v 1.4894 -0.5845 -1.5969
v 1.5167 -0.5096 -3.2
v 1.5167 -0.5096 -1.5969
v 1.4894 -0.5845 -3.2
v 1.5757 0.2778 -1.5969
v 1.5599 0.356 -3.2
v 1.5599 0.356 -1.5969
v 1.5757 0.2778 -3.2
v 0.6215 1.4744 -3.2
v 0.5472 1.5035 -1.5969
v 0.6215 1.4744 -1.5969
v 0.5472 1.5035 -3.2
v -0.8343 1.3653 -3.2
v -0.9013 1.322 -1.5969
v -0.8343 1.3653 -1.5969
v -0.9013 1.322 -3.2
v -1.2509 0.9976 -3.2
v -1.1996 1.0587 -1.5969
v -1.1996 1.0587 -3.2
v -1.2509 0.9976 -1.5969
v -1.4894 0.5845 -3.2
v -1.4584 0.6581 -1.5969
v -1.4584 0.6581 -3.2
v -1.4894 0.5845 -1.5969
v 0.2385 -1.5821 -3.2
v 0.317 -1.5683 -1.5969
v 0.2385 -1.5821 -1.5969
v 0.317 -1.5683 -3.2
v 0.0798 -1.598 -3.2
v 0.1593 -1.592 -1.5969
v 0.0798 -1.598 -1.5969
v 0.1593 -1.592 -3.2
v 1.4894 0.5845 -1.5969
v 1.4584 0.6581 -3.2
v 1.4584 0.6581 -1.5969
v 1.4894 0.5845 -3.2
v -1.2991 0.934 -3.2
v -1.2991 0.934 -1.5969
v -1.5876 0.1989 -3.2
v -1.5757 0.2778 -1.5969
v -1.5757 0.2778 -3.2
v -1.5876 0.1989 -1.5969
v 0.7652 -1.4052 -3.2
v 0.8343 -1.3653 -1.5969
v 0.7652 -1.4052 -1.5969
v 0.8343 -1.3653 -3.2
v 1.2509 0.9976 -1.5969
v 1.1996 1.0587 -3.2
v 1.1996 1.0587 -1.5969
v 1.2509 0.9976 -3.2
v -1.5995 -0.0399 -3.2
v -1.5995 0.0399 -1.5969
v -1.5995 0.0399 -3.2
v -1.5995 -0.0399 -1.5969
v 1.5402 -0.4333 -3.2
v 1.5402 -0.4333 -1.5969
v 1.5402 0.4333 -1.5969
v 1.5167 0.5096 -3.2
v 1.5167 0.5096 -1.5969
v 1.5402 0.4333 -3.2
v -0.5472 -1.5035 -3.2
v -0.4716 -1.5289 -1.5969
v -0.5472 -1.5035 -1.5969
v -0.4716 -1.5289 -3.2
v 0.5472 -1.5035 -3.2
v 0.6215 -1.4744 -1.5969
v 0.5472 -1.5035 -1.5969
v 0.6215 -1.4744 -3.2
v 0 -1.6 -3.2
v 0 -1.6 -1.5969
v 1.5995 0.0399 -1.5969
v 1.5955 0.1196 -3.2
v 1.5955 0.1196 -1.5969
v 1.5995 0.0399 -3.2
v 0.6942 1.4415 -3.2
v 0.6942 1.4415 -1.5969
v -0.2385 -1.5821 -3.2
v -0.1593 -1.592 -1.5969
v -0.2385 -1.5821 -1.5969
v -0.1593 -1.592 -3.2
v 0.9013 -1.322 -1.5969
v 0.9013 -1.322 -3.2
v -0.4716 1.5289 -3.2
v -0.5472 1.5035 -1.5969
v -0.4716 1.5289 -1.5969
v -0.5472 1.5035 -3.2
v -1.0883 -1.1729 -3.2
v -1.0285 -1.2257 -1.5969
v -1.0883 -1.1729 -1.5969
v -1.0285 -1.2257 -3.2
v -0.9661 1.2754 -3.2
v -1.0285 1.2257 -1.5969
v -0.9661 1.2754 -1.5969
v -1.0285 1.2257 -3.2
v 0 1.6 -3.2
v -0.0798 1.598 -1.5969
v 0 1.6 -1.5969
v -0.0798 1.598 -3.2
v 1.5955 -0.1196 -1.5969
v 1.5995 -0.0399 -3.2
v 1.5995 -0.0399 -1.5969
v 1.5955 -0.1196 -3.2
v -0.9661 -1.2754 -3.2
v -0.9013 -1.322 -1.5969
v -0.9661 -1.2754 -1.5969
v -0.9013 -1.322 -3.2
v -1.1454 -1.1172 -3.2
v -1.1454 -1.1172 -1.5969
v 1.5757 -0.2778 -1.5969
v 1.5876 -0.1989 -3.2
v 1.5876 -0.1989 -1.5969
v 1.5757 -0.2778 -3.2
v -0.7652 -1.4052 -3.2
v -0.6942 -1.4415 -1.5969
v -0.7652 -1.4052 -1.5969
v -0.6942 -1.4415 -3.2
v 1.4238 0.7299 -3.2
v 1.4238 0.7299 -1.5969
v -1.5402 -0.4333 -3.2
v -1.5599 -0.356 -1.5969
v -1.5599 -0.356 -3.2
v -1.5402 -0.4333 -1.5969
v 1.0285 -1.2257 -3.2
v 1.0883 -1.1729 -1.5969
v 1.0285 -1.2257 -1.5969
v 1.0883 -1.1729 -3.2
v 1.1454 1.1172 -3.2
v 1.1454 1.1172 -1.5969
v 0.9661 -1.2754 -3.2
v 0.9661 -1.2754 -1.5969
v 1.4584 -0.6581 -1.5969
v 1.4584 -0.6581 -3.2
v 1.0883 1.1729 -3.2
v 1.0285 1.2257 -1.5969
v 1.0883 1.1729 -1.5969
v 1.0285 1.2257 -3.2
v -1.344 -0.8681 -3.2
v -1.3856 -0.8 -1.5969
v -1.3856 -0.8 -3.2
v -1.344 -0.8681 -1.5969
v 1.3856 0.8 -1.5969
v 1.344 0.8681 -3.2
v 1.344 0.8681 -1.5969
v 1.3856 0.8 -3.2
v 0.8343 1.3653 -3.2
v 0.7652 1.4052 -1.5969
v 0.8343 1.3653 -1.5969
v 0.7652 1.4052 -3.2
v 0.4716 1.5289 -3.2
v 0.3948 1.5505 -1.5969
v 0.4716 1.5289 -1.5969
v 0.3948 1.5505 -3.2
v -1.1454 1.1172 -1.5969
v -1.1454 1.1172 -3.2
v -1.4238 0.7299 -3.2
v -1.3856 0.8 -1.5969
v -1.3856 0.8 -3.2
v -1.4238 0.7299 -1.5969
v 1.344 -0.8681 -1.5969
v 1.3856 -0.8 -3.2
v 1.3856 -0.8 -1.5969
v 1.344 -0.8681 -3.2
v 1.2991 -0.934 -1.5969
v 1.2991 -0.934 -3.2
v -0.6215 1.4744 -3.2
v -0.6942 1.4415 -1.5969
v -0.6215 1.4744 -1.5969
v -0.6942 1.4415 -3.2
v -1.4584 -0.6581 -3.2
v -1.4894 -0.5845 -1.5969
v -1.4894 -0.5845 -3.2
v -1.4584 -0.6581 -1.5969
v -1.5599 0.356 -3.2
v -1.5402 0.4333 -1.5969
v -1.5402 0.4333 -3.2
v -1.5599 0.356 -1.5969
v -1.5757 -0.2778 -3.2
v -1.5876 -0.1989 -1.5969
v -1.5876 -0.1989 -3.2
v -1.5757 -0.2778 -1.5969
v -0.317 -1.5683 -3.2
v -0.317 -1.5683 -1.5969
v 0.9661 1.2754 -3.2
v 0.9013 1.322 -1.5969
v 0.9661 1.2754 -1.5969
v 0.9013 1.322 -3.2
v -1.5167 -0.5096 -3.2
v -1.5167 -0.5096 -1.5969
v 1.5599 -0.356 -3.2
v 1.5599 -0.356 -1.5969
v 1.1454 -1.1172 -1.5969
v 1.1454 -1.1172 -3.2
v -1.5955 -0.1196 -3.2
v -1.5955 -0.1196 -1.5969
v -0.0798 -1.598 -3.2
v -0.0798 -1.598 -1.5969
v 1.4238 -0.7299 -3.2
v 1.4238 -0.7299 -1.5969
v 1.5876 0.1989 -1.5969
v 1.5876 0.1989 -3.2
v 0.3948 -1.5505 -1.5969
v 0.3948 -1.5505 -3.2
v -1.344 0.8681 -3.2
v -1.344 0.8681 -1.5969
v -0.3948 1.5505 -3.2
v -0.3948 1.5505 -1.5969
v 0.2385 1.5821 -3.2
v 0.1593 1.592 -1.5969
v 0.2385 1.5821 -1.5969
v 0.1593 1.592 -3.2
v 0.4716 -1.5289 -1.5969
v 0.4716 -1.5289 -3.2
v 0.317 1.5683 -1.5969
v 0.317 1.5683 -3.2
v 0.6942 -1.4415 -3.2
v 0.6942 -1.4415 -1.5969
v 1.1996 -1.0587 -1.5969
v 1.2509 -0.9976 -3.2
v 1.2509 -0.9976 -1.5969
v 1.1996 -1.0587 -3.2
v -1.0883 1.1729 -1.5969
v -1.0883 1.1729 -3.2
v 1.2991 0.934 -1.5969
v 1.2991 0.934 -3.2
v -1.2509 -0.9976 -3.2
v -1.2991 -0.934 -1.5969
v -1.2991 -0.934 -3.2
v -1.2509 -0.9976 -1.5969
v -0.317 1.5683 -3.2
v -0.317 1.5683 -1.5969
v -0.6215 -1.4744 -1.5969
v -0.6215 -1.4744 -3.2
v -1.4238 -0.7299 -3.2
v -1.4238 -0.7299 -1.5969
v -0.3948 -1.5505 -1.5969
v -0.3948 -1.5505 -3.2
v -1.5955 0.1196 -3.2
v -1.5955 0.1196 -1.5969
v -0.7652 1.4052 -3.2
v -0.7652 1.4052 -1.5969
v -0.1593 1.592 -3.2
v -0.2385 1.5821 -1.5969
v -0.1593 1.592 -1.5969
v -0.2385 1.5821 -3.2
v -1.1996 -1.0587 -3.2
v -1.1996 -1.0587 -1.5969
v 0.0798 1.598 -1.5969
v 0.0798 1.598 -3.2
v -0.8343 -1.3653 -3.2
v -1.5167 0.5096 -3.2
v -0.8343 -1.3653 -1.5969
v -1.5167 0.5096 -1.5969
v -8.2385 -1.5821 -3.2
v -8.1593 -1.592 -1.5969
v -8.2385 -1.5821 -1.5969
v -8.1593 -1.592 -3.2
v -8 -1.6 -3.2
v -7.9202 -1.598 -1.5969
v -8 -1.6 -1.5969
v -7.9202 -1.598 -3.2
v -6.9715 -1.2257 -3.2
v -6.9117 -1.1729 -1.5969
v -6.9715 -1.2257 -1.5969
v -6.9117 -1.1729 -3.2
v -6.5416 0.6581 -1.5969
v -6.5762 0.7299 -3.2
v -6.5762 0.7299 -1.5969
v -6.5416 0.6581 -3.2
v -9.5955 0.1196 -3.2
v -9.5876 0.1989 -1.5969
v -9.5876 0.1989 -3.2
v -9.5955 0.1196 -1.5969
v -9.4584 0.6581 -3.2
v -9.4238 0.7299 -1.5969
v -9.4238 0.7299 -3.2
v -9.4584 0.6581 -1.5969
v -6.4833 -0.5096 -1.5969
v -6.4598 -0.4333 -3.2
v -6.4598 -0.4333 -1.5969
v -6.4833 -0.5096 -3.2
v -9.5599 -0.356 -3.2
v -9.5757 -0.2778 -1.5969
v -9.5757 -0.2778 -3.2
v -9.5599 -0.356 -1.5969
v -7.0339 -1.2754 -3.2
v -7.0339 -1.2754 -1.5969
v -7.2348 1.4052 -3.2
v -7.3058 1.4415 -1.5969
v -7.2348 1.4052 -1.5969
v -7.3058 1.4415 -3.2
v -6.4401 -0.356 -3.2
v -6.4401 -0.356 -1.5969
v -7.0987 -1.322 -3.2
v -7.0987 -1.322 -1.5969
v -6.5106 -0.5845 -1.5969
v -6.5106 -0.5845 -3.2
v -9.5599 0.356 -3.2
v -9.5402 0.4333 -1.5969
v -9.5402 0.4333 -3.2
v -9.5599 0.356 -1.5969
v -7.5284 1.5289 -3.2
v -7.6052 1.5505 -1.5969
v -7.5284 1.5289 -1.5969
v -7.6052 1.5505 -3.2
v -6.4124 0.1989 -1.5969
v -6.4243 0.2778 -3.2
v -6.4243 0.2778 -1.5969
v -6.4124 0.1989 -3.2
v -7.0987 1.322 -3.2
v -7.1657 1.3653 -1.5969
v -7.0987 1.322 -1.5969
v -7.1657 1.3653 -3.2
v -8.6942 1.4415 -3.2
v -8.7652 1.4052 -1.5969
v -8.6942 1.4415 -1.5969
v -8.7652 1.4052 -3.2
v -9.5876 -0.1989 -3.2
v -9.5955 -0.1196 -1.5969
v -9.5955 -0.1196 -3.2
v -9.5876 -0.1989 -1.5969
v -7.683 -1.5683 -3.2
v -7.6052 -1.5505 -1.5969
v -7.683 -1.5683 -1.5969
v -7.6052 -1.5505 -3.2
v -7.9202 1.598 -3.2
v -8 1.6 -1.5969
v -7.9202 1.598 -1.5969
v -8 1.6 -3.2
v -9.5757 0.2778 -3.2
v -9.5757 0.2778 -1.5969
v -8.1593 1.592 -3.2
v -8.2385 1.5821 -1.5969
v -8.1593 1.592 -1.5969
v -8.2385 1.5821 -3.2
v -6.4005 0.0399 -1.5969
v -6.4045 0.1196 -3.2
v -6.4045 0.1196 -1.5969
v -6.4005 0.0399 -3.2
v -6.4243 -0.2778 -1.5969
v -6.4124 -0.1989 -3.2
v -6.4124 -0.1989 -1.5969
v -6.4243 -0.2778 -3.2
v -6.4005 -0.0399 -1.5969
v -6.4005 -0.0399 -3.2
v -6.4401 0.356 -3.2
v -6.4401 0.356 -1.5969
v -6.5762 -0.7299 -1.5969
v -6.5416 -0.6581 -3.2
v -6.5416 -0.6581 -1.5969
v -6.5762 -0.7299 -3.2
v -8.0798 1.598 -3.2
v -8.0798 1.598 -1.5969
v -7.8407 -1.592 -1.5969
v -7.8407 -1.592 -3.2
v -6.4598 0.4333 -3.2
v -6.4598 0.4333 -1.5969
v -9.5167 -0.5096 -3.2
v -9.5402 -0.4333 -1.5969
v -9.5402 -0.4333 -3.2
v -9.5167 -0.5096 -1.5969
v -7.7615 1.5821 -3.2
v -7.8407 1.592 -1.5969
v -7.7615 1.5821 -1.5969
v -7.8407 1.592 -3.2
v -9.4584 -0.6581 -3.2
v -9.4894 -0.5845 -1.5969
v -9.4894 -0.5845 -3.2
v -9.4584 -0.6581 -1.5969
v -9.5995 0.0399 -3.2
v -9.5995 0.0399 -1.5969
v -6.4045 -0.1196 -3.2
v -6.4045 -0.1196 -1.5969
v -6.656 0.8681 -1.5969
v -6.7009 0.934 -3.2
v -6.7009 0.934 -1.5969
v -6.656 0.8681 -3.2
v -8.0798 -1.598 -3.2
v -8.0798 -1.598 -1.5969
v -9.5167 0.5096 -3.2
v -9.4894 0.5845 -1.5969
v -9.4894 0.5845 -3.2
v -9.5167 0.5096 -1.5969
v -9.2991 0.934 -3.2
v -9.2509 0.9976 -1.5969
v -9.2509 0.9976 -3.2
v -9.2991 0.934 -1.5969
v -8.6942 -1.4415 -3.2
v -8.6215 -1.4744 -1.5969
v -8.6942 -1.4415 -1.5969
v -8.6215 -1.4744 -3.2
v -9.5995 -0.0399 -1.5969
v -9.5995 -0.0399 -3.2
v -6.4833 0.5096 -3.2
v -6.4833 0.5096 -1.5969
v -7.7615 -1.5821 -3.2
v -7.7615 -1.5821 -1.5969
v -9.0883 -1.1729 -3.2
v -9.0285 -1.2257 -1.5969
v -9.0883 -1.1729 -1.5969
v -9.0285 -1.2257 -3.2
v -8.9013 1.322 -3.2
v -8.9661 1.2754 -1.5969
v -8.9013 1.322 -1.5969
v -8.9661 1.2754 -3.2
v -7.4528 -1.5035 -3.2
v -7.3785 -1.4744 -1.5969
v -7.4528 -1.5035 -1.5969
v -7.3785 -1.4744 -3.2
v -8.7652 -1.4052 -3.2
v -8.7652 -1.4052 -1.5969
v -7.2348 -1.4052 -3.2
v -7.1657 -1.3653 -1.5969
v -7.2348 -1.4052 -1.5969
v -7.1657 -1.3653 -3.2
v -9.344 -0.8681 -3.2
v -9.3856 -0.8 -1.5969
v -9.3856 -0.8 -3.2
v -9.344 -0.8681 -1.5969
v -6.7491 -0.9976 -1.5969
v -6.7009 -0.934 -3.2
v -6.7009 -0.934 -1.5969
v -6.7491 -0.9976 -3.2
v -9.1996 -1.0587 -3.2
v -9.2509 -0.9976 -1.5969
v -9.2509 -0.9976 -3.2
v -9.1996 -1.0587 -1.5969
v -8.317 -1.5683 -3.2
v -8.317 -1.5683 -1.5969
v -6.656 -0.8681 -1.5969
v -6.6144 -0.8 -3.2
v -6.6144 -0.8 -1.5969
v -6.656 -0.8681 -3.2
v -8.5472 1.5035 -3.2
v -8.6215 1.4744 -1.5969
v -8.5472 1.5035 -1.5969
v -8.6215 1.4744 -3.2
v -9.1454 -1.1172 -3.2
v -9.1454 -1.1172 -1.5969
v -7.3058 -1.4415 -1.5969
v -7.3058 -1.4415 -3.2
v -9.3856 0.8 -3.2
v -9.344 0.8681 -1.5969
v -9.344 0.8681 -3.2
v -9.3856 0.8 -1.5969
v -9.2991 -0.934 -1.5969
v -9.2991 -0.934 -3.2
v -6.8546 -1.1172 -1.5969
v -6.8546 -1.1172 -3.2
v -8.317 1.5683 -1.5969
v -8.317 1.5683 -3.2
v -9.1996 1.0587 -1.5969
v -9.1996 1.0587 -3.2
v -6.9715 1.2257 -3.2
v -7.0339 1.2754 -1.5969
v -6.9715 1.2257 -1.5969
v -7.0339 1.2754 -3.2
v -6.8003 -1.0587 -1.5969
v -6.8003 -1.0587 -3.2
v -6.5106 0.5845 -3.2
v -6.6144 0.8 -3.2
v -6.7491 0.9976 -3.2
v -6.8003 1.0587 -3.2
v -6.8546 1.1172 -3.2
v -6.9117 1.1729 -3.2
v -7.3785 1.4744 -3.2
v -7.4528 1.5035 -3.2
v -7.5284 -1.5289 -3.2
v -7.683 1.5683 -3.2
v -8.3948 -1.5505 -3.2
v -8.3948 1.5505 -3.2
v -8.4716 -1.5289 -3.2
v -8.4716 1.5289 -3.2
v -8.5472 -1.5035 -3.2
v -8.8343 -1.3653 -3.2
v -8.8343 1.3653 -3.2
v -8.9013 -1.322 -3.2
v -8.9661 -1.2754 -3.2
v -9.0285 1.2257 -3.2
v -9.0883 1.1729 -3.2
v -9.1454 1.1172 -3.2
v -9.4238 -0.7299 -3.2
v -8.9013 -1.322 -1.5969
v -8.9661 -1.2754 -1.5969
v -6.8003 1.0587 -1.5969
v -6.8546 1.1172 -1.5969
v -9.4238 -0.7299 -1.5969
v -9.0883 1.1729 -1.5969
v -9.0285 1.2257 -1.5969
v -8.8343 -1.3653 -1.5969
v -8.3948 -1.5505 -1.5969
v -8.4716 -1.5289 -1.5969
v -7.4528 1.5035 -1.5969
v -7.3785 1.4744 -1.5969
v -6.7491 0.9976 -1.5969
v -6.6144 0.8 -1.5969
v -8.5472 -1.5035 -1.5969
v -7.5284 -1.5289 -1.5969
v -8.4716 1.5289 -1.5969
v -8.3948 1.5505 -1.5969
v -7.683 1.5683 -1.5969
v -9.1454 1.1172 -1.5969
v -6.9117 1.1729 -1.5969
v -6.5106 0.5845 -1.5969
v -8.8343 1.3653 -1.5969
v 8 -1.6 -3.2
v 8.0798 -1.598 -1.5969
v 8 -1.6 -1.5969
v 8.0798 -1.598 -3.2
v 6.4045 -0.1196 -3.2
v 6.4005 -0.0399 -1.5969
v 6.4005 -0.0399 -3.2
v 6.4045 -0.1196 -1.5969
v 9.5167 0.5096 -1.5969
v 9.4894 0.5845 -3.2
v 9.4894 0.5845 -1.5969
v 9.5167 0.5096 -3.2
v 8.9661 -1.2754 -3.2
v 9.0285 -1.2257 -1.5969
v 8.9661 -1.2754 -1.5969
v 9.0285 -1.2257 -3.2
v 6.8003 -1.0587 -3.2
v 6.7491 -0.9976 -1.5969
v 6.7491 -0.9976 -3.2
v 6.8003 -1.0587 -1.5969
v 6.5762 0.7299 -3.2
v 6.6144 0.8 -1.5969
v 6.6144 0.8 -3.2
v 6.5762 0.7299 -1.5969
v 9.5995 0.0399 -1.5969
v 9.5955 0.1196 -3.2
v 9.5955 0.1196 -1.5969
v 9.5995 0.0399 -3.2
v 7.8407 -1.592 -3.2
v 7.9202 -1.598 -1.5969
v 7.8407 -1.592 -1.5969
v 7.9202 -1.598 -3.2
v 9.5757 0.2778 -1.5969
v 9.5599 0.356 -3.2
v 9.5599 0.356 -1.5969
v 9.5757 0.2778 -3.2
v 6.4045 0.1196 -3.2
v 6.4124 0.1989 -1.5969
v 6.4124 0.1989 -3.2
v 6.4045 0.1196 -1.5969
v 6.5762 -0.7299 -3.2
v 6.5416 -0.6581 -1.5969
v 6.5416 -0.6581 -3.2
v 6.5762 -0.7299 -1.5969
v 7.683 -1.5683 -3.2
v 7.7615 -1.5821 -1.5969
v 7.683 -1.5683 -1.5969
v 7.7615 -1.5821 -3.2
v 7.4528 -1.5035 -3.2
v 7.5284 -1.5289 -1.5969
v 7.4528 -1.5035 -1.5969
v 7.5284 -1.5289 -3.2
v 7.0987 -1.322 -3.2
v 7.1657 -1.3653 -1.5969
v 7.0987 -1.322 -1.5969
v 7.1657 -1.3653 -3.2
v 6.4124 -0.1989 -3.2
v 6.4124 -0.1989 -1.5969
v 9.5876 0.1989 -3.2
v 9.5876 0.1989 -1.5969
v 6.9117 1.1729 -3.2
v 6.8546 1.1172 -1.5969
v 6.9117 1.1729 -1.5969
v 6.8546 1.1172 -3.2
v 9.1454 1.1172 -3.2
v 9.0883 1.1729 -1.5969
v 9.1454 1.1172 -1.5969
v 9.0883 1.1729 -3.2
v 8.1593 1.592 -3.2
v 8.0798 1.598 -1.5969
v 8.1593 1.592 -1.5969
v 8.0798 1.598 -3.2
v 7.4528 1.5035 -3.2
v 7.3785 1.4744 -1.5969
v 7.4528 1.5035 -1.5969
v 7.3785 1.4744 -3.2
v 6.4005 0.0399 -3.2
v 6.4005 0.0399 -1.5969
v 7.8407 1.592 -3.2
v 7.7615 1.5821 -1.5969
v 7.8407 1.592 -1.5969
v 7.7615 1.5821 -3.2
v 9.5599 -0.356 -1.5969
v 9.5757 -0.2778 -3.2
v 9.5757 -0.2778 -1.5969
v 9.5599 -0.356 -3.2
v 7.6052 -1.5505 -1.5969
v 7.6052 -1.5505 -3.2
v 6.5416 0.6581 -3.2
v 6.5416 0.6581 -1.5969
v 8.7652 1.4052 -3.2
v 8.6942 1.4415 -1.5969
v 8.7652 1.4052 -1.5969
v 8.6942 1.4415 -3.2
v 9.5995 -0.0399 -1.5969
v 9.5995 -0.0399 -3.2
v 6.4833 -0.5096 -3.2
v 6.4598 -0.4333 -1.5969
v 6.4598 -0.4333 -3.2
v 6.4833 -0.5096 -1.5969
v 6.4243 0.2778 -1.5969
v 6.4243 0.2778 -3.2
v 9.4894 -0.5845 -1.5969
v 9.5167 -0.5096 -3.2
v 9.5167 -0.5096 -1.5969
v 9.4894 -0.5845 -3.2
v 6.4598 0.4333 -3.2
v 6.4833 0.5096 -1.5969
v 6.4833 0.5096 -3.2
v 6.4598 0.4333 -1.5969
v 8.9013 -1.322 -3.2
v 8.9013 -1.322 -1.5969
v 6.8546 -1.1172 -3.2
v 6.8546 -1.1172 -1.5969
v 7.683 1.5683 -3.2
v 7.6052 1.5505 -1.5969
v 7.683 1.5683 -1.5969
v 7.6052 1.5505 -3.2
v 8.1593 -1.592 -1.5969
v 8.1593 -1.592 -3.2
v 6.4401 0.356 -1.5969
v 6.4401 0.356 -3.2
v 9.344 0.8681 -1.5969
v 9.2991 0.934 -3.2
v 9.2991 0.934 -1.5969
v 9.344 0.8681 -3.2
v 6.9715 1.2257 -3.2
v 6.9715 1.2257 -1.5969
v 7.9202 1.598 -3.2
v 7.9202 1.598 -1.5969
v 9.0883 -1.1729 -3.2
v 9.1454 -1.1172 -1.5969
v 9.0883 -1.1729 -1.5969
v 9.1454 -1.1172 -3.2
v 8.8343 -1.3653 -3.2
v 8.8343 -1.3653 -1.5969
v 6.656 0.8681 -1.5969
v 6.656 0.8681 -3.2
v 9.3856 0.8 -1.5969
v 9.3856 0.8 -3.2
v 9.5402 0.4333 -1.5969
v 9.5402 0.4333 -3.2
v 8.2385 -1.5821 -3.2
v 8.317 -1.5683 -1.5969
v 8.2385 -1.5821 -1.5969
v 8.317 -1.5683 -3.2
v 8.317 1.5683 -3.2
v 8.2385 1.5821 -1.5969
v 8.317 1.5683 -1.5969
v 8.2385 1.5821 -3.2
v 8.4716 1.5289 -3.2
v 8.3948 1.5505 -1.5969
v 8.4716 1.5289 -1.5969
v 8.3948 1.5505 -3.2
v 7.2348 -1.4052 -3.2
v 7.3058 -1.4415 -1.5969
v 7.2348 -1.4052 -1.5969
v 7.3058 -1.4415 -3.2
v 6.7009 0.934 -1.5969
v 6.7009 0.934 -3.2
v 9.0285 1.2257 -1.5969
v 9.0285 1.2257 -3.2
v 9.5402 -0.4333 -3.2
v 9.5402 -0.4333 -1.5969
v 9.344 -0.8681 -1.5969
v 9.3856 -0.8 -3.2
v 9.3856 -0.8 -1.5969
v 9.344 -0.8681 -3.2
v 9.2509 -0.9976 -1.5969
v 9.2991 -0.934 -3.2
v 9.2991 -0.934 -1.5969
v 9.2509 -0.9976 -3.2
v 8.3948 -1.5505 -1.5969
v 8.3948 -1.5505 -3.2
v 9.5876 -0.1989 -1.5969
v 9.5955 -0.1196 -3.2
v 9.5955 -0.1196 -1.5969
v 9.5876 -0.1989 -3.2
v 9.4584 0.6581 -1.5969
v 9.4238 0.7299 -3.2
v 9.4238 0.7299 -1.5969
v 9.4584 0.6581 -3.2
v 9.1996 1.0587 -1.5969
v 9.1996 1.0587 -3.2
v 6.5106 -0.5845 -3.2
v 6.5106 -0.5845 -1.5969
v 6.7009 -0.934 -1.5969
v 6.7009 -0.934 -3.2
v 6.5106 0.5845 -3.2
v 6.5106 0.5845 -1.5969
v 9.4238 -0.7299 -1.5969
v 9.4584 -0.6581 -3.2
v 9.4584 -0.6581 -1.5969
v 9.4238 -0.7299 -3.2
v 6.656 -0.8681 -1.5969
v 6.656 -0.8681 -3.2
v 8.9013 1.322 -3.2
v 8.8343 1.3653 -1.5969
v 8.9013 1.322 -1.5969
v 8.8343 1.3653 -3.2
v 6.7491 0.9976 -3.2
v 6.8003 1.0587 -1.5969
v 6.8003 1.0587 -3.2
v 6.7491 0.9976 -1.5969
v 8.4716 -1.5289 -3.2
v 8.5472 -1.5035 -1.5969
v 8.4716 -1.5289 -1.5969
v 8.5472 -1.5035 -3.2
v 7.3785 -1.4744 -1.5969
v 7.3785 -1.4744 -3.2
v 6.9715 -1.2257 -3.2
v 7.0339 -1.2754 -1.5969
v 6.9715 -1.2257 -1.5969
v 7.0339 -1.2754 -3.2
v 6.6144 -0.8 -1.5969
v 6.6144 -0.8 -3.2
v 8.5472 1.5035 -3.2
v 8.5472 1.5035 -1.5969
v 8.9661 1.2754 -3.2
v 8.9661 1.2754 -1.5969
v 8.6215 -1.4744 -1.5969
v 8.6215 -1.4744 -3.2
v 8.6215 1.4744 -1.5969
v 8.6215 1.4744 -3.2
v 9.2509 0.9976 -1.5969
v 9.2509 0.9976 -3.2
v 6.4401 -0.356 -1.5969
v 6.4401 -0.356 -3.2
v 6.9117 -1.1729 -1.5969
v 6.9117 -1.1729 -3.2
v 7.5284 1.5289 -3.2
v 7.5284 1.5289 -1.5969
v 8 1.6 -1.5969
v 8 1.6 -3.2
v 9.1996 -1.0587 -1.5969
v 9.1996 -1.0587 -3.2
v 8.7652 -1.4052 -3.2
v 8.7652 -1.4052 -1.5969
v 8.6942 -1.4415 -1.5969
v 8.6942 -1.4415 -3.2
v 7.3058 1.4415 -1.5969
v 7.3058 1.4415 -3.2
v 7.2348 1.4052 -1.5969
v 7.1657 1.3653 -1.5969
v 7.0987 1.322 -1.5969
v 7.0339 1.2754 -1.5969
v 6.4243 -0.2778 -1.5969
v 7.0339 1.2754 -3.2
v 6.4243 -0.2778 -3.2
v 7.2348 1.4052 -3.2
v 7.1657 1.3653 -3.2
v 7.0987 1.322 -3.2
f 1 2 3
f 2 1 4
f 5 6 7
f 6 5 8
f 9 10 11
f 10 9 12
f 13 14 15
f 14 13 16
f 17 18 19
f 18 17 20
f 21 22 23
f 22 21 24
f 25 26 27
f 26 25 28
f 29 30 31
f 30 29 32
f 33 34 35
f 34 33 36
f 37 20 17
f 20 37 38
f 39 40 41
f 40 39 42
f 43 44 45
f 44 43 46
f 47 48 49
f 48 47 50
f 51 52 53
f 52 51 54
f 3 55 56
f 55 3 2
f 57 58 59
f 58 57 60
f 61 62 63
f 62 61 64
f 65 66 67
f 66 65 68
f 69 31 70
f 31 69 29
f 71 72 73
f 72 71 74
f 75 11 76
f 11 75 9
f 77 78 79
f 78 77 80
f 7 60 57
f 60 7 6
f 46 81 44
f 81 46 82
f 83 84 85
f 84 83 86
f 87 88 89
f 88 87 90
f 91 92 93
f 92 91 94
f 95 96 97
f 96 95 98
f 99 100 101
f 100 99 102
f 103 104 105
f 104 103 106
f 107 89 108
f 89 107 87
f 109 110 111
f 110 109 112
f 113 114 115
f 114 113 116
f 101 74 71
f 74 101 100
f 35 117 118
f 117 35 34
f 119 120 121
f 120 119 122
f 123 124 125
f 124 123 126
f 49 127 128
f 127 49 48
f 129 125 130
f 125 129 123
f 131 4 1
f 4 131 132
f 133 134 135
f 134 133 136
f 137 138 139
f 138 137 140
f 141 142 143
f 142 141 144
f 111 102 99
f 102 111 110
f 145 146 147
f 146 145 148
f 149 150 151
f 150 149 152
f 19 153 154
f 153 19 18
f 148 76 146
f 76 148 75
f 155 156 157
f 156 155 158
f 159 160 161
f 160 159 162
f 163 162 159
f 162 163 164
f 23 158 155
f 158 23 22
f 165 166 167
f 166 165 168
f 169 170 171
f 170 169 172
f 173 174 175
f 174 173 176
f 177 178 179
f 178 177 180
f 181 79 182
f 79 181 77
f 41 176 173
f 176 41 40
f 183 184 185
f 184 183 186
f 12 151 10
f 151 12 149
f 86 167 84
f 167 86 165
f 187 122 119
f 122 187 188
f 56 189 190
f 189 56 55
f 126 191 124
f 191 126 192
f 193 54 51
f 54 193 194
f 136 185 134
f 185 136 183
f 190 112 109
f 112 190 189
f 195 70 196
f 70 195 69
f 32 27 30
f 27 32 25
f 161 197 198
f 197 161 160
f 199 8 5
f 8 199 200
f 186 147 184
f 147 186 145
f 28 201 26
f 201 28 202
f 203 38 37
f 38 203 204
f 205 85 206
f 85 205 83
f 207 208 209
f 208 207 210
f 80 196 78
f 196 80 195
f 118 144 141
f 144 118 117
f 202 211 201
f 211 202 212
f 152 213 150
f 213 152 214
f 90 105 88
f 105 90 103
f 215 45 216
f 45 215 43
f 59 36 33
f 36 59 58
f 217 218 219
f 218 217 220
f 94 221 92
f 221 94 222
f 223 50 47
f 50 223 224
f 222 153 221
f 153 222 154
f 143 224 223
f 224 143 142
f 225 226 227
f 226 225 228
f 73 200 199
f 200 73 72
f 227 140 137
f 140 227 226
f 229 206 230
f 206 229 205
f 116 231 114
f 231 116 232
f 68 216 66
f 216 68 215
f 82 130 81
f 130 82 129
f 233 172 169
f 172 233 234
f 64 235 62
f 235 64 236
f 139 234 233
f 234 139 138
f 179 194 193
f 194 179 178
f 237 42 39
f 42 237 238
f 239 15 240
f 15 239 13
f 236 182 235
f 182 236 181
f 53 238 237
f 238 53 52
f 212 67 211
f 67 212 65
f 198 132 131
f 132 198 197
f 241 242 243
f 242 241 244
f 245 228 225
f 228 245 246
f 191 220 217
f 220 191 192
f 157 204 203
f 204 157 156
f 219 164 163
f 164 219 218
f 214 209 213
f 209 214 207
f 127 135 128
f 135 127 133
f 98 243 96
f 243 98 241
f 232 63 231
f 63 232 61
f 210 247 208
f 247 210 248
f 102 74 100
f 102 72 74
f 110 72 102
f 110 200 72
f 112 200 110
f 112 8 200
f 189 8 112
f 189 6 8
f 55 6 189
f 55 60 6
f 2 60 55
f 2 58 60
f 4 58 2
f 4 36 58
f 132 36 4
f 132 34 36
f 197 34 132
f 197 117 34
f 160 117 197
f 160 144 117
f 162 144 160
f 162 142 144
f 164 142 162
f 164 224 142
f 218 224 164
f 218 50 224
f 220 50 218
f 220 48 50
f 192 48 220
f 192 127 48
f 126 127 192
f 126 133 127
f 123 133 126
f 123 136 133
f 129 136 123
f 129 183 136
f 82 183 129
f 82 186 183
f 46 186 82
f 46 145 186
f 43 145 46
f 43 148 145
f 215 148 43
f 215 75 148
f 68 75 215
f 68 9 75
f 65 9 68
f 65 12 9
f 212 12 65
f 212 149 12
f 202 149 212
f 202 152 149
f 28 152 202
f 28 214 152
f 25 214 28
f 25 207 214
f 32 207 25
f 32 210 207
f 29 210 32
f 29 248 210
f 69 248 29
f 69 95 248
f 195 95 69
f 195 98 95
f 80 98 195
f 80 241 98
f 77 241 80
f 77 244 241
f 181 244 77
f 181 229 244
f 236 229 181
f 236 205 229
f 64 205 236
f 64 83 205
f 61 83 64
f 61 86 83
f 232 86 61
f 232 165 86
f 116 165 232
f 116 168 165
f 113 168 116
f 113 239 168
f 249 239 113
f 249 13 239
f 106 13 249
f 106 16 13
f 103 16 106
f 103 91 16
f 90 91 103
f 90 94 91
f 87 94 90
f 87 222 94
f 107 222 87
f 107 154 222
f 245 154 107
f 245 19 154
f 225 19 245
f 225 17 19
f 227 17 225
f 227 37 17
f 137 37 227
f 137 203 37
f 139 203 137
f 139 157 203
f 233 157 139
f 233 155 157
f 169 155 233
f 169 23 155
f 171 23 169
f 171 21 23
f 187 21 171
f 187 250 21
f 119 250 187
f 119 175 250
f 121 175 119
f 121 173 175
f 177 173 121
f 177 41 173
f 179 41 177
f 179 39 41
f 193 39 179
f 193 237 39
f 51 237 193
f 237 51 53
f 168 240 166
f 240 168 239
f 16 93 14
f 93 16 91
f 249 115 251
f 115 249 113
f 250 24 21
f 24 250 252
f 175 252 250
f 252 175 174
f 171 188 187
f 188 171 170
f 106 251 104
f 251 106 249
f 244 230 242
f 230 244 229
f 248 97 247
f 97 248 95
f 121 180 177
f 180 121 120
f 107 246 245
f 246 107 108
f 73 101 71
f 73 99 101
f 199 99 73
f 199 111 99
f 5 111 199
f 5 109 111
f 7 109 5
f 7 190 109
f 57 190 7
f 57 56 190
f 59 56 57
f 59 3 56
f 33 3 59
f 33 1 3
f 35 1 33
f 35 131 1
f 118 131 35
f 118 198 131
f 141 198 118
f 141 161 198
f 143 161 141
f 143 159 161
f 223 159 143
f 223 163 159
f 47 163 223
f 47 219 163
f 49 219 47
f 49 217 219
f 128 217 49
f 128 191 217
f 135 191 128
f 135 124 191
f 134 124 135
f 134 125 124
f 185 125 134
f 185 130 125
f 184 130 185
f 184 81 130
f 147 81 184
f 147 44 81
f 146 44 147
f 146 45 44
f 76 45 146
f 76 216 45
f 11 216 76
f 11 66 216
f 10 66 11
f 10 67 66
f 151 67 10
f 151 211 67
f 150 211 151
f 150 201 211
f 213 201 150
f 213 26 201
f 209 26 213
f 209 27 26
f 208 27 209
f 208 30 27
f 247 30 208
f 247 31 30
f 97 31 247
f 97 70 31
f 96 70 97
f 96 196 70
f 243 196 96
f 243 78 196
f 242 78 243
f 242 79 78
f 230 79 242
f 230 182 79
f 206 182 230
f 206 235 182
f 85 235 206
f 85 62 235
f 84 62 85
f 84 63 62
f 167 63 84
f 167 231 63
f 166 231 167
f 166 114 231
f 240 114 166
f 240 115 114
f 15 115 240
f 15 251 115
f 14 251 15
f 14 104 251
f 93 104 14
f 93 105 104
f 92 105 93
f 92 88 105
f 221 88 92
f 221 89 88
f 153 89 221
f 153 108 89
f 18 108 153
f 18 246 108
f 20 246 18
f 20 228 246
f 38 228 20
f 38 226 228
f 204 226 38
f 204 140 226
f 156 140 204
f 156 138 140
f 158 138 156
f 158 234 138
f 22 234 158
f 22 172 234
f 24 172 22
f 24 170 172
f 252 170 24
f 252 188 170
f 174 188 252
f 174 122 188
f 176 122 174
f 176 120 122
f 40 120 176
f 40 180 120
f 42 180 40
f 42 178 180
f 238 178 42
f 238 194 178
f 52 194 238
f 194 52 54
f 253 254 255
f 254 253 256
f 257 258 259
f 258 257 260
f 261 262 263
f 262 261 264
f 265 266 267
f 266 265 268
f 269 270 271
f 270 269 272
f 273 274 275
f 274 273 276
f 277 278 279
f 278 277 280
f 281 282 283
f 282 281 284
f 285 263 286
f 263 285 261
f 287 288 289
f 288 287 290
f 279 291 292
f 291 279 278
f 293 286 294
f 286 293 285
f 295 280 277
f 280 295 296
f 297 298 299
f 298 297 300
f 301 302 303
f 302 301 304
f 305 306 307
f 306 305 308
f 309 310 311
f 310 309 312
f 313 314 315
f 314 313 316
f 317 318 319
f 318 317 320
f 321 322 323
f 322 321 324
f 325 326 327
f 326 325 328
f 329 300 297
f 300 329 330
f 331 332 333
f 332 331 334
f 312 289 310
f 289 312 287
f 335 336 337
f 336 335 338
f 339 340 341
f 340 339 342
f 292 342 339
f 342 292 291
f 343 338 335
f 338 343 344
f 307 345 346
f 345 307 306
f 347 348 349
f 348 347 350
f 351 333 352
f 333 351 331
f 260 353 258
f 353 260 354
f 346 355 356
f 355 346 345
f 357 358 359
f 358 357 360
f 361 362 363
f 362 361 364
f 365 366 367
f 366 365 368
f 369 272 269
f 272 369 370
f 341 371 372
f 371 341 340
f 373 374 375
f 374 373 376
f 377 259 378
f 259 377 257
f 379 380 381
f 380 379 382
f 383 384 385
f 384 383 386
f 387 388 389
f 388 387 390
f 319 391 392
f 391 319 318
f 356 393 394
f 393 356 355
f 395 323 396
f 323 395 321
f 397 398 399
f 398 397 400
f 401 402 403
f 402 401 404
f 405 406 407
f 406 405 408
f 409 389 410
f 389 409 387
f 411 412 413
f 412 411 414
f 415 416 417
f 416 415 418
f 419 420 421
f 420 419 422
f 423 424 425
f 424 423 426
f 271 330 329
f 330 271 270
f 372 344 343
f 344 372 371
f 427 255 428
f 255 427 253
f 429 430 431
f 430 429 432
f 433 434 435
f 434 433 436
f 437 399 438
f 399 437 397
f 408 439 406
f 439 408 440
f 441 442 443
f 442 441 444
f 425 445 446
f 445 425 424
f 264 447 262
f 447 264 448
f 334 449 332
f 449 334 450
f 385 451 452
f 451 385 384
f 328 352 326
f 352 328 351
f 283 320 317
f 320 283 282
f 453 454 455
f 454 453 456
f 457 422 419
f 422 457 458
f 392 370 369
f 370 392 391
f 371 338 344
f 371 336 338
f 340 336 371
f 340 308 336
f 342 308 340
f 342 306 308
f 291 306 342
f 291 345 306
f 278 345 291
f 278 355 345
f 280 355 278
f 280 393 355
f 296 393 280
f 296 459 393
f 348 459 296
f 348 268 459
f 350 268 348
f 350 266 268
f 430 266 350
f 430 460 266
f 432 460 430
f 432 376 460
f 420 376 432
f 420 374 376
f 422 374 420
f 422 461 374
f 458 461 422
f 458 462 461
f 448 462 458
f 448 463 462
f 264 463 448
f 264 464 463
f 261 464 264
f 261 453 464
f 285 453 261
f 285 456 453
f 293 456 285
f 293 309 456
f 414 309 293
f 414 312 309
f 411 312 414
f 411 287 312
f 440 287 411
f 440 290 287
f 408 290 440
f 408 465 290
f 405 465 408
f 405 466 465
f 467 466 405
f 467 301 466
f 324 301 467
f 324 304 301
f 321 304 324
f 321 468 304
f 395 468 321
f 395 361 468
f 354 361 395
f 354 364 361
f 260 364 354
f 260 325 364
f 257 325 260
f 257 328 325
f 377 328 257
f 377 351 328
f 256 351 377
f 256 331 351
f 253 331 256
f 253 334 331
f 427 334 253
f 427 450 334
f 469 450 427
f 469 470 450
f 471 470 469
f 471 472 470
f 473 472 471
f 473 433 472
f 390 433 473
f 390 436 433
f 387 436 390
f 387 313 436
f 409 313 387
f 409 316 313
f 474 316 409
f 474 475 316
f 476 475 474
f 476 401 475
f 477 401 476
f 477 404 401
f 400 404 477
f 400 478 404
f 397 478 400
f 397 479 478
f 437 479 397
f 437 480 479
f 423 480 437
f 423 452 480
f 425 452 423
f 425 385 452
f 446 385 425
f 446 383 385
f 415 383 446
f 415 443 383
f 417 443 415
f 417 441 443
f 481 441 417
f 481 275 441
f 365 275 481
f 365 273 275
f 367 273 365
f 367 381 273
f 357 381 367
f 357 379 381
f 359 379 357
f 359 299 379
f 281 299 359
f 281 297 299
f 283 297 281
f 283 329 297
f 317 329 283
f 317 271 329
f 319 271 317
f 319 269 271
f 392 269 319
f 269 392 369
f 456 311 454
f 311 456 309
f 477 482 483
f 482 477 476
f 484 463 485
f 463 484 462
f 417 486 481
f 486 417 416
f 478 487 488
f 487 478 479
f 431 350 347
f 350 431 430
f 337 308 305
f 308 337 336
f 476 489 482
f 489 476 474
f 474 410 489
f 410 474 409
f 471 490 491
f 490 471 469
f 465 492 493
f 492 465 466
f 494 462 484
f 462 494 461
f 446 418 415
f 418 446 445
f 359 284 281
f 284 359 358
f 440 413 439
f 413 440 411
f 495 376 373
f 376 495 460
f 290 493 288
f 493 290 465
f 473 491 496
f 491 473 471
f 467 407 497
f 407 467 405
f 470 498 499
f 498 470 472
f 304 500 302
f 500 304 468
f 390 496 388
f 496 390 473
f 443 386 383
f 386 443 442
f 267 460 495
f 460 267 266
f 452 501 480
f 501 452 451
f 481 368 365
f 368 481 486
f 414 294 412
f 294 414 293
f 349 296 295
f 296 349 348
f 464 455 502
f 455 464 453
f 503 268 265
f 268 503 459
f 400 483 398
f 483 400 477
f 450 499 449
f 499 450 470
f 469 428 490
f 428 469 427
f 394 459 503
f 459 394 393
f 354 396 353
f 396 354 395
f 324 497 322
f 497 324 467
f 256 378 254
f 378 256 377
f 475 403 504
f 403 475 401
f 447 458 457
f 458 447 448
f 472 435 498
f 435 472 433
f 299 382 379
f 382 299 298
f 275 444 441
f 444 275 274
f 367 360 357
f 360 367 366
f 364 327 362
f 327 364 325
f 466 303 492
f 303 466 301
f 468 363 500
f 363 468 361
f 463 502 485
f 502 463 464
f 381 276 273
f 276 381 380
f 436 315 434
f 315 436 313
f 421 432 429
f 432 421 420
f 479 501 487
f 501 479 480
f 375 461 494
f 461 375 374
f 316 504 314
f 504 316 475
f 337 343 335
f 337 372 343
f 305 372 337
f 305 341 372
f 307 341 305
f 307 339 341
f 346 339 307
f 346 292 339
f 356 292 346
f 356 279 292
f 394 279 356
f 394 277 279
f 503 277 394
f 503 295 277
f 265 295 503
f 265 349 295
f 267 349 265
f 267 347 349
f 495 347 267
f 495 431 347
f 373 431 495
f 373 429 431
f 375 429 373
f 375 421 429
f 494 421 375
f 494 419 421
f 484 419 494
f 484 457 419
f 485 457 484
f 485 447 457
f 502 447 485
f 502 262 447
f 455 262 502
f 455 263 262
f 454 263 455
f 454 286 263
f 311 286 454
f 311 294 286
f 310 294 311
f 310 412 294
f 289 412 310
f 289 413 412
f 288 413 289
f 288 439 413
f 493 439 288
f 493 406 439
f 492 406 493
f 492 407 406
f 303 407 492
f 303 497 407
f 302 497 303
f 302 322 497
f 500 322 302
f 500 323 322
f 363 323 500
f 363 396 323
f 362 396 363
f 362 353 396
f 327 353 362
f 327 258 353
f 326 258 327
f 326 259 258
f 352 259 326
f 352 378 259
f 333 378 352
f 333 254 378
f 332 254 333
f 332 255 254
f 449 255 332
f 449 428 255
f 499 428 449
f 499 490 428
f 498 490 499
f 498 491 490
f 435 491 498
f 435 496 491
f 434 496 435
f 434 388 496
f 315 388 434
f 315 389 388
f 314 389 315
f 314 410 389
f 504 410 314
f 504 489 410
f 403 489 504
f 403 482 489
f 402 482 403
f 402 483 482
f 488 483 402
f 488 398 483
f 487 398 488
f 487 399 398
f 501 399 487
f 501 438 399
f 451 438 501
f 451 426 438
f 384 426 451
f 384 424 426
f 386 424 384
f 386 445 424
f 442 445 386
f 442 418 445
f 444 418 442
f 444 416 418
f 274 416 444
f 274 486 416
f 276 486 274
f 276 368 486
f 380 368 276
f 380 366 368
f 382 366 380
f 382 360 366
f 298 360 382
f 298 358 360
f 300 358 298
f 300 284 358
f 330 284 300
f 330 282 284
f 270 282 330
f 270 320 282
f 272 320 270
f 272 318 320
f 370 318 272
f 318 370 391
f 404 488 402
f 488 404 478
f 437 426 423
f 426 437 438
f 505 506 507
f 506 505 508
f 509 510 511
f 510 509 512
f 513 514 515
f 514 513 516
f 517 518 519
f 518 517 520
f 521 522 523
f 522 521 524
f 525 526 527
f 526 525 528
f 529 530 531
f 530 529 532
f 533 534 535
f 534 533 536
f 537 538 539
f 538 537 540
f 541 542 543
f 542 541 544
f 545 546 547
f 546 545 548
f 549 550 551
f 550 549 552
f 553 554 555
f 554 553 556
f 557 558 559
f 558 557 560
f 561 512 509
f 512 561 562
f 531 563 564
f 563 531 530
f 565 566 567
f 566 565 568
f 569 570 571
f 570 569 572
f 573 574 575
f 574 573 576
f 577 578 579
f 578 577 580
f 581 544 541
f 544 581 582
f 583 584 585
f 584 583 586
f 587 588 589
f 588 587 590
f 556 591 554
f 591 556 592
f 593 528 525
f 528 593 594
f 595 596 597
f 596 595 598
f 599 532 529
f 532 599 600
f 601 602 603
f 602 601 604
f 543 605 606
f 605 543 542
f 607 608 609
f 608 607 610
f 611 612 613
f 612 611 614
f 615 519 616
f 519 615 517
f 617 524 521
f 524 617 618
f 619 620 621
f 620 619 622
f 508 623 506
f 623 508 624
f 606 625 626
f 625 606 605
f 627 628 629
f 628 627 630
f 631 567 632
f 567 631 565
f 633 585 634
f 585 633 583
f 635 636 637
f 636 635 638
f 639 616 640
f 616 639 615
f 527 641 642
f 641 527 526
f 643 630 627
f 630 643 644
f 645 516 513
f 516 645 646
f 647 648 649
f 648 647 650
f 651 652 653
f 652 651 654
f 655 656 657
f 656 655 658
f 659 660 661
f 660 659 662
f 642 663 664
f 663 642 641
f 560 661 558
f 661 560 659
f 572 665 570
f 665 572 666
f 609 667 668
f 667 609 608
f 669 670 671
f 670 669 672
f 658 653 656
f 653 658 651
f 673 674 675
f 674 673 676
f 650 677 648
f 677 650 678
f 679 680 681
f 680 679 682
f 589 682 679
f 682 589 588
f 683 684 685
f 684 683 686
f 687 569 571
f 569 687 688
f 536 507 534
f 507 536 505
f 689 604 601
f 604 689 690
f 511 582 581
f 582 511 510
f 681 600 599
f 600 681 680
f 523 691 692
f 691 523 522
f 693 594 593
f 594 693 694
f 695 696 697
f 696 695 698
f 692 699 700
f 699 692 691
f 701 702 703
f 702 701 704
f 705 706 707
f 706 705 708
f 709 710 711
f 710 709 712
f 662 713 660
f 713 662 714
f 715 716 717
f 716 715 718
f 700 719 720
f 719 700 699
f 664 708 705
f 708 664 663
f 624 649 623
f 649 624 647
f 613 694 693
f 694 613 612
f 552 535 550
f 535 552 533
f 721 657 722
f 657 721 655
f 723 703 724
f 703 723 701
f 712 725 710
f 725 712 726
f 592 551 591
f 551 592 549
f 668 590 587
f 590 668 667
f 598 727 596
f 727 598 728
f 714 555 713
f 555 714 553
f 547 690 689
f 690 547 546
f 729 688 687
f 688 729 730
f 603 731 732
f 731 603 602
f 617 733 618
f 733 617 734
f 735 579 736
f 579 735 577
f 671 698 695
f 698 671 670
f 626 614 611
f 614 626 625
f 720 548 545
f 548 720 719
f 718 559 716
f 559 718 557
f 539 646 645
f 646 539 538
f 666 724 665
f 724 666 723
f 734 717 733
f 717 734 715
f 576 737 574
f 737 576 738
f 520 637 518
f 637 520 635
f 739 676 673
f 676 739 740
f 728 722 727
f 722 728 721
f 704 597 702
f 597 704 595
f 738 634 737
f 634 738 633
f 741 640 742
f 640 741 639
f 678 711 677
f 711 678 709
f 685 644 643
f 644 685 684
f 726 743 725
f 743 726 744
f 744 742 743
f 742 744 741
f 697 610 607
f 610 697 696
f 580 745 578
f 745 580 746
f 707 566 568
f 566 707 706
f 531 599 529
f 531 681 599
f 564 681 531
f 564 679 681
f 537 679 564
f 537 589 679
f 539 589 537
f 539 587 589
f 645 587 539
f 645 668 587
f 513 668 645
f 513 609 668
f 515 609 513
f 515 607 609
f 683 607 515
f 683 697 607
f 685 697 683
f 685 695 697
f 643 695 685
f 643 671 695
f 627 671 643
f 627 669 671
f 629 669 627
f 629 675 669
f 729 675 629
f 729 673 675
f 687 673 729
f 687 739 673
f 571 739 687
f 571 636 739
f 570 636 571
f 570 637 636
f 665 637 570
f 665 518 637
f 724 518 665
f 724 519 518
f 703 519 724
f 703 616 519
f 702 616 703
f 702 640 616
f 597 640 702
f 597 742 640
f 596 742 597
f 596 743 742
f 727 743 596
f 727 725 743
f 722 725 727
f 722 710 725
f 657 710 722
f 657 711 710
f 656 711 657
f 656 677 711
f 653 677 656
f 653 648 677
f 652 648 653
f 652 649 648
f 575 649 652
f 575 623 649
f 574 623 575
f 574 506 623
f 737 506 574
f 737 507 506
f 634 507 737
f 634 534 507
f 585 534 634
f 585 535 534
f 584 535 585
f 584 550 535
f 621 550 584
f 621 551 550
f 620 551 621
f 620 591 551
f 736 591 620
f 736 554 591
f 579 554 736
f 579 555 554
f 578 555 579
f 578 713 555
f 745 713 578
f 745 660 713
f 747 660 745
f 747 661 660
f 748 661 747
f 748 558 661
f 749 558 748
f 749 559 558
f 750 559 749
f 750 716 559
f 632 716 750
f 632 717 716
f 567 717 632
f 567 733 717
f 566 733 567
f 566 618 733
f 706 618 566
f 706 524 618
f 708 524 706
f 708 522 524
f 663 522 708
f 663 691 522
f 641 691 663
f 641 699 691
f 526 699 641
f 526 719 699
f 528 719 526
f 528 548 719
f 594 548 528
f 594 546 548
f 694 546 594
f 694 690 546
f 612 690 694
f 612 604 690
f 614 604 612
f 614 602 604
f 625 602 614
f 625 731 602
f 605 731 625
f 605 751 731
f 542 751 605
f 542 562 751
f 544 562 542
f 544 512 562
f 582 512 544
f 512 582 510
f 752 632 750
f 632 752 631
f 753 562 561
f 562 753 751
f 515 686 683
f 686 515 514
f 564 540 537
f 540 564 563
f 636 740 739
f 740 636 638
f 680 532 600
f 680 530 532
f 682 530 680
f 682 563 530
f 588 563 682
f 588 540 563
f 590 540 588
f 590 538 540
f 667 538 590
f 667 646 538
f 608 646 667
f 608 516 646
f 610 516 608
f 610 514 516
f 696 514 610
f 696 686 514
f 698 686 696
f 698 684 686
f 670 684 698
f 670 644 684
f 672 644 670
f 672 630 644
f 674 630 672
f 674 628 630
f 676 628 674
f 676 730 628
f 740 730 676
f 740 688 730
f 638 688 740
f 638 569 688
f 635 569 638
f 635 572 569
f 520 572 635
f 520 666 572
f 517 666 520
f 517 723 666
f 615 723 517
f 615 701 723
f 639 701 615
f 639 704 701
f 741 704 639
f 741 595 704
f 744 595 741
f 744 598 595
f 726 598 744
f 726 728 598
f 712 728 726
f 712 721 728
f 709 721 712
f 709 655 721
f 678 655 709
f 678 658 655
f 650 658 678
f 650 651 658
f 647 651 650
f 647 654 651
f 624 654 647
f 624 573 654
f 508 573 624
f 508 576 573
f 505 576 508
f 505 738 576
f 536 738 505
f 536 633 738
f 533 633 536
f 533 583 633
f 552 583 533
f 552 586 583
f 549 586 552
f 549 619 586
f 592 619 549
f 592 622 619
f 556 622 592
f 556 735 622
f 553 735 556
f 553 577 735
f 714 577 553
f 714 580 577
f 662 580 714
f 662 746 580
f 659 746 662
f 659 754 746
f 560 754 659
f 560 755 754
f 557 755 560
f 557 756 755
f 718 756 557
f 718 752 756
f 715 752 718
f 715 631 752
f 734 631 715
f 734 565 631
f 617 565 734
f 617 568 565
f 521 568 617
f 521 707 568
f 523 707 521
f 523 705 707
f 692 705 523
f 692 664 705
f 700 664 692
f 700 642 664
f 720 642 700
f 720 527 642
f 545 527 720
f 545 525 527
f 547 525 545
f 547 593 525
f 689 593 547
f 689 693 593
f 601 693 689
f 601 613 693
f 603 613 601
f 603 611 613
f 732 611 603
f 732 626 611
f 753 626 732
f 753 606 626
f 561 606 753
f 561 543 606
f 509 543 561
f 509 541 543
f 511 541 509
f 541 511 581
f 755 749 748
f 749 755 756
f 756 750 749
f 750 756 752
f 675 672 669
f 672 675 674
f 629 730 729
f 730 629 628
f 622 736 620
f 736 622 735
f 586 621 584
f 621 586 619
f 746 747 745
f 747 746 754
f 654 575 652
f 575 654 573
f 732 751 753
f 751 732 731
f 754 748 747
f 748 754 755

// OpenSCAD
use <../lib.scad>
use <2431.scad>
use <6005724a1.scad>
$fa=1; $fs=0.2;
function ldraw_lib__2431dm0(realsolid=false) = [
// 0 Tile  1 x  4 with Wood Grain and Nails Type 1 Sticker
// 0 Name: 2431dm0.dat
// 0 Author: Christian Neumann [Wesley]
// 0 !LDRAW_ORG Shortcut UPDATE 2014-02
// 0 !LICENSE Licensed under CC BY 2.0 and CC BY 4.0 : see CAreadme.txt
// 
// 0 BFC CERTIFY CCW
  [0,"BFC","CERTIFY"],
  [0,"BFC","CCW"],
// 
// 0 !KEYWORDS Lord of the Rings, LOTR, Mines of Moria, Set 9473
// 
// 0 !CMDLINE -c70
// 
// 0 !HISTORY 2014-12-23 [PTadmin] Official Update 2014-02
// 
// 
// 1 16 0 0 0 1 0 0 0 1 0 0 0 1 2431.dat
  [1,16,0,0,0,1,0,0,0,1,0,0,0,1, ldraw_lib__2431(realsolid)],
// 1 16 0 0 0 1 0 0 0 1 0 0 0 1 6005724a1.dat
  [1,16,0,0,0,1,0,0,0,1,0,0,0,1, ldraw_lib__6005724a1(realsolid)],
];
module ldraw_lib__2431dm0(step=0, col=false, unit=2/5, alt=false, line=0.2, solid=!$preview)
    makepoly(ldraw_lib__2431dm0(solid), step=step, col=col, unit=unit, alt=alt, line=line, solid=solid);
ldraw_lib__2431dm0(line=0.2);
